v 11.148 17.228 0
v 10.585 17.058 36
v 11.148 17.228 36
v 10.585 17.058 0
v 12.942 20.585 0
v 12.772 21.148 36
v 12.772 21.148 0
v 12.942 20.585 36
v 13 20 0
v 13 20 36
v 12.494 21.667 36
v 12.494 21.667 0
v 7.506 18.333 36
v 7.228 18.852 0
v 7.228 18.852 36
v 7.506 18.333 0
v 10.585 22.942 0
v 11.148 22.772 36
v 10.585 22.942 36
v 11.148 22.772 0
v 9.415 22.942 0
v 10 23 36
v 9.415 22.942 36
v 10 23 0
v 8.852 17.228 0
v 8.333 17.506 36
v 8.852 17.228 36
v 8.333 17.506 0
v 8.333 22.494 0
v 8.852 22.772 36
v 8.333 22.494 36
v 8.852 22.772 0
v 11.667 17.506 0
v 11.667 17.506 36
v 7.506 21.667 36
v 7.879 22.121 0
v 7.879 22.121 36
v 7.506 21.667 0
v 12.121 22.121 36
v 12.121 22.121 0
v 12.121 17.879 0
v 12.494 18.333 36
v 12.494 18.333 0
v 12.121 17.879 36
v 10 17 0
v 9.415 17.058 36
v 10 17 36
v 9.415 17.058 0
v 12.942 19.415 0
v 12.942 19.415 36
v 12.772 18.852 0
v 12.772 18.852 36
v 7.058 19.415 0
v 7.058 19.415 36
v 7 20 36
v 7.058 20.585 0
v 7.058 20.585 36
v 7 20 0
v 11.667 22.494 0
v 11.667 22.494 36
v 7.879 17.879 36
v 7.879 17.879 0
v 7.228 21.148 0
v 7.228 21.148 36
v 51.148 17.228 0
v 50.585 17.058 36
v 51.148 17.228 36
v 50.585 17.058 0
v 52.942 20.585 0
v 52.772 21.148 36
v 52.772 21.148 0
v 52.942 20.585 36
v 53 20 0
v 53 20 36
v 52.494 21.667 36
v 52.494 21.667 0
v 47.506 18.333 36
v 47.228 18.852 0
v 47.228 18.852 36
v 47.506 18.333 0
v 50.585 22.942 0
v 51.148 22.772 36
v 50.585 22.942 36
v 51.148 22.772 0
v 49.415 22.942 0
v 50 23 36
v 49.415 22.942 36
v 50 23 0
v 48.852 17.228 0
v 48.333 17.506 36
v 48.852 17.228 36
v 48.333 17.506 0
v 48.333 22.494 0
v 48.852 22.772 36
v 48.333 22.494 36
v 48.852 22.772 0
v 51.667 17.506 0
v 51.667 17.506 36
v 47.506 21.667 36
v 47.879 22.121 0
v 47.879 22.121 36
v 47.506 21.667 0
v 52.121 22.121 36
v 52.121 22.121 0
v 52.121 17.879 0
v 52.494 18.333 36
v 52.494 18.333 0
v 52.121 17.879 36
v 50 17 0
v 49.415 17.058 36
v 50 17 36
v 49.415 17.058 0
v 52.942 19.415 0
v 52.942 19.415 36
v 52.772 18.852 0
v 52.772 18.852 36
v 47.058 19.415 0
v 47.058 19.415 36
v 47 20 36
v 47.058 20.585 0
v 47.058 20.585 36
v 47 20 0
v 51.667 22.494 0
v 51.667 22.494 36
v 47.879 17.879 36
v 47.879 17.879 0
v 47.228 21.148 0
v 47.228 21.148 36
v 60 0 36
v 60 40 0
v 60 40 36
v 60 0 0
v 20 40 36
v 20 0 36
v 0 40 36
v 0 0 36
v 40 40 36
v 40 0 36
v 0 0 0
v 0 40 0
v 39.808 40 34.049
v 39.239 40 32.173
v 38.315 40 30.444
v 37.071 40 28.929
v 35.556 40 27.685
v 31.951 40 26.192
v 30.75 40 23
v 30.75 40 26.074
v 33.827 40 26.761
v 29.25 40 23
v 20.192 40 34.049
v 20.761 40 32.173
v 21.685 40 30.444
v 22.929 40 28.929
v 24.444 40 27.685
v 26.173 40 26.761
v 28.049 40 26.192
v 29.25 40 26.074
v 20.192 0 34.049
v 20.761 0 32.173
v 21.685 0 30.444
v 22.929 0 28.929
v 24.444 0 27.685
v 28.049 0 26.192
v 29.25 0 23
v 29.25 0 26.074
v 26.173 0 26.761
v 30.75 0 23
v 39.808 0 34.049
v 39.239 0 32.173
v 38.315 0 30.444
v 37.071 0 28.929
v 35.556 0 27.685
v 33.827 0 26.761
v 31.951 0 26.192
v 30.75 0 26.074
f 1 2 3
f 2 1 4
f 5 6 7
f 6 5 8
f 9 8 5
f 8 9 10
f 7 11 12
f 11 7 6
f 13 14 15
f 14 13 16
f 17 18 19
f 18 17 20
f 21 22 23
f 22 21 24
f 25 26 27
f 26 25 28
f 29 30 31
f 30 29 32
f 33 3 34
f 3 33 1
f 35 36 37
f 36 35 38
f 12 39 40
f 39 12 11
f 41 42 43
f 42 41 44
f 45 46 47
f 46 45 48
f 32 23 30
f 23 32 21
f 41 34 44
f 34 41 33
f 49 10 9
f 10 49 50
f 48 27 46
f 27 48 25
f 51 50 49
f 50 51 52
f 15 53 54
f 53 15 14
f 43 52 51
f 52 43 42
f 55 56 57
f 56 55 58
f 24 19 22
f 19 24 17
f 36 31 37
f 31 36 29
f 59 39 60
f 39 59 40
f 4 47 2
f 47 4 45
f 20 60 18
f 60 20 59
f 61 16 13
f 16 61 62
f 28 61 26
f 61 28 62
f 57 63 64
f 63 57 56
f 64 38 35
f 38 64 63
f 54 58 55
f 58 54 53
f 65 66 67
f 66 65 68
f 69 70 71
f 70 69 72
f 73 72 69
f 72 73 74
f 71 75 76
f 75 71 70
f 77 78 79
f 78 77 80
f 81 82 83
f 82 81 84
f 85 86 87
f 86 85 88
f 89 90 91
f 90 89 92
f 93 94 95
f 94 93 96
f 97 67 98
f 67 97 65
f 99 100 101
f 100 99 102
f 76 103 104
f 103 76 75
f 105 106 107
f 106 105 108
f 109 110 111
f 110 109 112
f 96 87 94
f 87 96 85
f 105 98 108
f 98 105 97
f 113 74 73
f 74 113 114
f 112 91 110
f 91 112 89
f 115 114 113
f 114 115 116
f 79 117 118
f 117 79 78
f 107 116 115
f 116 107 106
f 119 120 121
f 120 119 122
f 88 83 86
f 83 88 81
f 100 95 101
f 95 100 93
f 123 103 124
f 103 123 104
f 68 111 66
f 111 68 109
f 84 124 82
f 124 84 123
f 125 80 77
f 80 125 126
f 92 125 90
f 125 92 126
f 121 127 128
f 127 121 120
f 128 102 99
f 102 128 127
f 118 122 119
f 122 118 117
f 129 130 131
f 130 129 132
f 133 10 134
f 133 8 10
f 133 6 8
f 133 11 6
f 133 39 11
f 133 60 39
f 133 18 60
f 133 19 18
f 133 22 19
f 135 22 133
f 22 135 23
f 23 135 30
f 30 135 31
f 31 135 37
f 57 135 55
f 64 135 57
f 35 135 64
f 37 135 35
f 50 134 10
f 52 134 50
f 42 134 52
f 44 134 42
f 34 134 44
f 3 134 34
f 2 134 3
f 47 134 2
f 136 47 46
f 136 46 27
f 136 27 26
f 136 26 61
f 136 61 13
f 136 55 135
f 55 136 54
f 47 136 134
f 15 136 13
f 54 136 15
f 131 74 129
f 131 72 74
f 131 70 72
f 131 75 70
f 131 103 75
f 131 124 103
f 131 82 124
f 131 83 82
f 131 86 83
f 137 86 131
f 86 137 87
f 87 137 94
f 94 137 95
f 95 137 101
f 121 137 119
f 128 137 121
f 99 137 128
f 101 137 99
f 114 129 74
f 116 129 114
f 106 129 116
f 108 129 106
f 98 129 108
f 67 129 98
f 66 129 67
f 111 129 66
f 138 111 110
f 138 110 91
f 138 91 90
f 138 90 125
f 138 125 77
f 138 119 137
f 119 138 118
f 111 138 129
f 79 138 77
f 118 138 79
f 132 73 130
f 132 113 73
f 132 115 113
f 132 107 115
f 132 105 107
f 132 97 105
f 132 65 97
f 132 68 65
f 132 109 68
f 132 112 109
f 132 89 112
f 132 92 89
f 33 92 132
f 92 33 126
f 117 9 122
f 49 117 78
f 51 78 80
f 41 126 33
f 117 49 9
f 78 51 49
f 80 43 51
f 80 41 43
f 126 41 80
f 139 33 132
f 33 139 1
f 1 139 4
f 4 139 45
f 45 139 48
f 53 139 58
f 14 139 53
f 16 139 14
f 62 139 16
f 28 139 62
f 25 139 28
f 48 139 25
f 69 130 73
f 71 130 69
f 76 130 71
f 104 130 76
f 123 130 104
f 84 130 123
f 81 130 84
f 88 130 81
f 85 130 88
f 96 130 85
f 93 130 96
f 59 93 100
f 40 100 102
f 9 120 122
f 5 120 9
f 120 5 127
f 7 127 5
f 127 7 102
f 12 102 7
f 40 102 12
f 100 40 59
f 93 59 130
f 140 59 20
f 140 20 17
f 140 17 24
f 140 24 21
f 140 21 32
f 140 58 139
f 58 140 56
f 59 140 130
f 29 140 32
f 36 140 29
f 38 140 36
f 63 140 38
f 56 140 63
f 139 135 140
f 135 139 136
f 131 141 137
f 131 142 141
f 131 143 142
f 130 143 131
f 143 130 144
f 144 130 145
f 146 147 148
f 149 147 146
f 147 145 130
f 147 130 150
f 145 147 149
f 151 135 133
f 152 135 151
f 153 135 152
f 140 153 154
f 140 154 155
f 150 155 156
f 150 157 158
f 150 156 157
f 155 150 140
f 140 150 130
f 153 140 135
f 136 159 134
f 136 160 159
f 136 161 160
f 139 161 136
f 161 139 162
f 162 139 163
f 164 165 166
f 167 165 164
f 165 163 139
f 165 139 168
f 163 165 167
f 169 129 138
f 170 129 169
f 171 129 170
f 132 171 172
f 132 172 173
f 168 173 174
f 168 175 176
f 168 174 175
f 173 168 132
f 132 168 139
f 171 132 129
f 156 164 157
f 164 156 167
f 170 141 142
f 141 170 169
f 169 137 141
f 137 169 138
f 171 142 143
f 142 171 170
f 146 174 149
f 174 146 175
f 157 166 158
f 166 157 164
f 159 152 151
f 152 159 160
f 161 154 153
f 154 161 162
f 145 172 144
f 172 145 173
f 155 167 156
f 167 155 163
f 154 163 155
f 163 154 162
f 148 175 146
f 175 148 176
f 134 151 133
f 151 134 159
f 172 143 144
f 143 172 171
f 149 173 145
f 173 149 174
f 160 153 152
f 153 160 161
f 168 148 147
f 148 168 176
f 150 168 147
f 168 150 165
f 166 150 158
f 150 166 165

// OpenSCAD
$fn = 32;

// ----------------------------------------------------------------------
// Saddle clamp: split shaft clamp
// ----------------------------------------------------------------------

// --- parameters (mm) ---
blk_l = 60;               // block length, X
blk_w = 40;               // block width, Y
blk_h = 36;               // block height
clamp_r = 10;             // shaft groove radius
hole_r = 3;               // bolt hole radius
hole_m = 10;              // bolt hole margin from the ends
saw_w = 1.5;              // saw kerf width

saw_depth = clamp_r + 3;  // saw kerf depth

difference() {
  cube([blk_l, blk_w, blk_h]);
  translate([blk_l / 2, -1, blk_h])
    rotate([-90, 0, 0])
      cylinder(h = blk_w + 2, r = clamp_r);
  for (sx = [0, 1])
    translate([sx ? blk_l - hole_m : hole_m, blk_w / 2, -1])
      cylinder(r = hole_r, h = blk_h + 2);
  translate([blk_l / 2 - saw_w / 2, -1, blk_h - saw_depth])
    cube([saw_w, blk_w + 2, saw_depth + 1]);
}
